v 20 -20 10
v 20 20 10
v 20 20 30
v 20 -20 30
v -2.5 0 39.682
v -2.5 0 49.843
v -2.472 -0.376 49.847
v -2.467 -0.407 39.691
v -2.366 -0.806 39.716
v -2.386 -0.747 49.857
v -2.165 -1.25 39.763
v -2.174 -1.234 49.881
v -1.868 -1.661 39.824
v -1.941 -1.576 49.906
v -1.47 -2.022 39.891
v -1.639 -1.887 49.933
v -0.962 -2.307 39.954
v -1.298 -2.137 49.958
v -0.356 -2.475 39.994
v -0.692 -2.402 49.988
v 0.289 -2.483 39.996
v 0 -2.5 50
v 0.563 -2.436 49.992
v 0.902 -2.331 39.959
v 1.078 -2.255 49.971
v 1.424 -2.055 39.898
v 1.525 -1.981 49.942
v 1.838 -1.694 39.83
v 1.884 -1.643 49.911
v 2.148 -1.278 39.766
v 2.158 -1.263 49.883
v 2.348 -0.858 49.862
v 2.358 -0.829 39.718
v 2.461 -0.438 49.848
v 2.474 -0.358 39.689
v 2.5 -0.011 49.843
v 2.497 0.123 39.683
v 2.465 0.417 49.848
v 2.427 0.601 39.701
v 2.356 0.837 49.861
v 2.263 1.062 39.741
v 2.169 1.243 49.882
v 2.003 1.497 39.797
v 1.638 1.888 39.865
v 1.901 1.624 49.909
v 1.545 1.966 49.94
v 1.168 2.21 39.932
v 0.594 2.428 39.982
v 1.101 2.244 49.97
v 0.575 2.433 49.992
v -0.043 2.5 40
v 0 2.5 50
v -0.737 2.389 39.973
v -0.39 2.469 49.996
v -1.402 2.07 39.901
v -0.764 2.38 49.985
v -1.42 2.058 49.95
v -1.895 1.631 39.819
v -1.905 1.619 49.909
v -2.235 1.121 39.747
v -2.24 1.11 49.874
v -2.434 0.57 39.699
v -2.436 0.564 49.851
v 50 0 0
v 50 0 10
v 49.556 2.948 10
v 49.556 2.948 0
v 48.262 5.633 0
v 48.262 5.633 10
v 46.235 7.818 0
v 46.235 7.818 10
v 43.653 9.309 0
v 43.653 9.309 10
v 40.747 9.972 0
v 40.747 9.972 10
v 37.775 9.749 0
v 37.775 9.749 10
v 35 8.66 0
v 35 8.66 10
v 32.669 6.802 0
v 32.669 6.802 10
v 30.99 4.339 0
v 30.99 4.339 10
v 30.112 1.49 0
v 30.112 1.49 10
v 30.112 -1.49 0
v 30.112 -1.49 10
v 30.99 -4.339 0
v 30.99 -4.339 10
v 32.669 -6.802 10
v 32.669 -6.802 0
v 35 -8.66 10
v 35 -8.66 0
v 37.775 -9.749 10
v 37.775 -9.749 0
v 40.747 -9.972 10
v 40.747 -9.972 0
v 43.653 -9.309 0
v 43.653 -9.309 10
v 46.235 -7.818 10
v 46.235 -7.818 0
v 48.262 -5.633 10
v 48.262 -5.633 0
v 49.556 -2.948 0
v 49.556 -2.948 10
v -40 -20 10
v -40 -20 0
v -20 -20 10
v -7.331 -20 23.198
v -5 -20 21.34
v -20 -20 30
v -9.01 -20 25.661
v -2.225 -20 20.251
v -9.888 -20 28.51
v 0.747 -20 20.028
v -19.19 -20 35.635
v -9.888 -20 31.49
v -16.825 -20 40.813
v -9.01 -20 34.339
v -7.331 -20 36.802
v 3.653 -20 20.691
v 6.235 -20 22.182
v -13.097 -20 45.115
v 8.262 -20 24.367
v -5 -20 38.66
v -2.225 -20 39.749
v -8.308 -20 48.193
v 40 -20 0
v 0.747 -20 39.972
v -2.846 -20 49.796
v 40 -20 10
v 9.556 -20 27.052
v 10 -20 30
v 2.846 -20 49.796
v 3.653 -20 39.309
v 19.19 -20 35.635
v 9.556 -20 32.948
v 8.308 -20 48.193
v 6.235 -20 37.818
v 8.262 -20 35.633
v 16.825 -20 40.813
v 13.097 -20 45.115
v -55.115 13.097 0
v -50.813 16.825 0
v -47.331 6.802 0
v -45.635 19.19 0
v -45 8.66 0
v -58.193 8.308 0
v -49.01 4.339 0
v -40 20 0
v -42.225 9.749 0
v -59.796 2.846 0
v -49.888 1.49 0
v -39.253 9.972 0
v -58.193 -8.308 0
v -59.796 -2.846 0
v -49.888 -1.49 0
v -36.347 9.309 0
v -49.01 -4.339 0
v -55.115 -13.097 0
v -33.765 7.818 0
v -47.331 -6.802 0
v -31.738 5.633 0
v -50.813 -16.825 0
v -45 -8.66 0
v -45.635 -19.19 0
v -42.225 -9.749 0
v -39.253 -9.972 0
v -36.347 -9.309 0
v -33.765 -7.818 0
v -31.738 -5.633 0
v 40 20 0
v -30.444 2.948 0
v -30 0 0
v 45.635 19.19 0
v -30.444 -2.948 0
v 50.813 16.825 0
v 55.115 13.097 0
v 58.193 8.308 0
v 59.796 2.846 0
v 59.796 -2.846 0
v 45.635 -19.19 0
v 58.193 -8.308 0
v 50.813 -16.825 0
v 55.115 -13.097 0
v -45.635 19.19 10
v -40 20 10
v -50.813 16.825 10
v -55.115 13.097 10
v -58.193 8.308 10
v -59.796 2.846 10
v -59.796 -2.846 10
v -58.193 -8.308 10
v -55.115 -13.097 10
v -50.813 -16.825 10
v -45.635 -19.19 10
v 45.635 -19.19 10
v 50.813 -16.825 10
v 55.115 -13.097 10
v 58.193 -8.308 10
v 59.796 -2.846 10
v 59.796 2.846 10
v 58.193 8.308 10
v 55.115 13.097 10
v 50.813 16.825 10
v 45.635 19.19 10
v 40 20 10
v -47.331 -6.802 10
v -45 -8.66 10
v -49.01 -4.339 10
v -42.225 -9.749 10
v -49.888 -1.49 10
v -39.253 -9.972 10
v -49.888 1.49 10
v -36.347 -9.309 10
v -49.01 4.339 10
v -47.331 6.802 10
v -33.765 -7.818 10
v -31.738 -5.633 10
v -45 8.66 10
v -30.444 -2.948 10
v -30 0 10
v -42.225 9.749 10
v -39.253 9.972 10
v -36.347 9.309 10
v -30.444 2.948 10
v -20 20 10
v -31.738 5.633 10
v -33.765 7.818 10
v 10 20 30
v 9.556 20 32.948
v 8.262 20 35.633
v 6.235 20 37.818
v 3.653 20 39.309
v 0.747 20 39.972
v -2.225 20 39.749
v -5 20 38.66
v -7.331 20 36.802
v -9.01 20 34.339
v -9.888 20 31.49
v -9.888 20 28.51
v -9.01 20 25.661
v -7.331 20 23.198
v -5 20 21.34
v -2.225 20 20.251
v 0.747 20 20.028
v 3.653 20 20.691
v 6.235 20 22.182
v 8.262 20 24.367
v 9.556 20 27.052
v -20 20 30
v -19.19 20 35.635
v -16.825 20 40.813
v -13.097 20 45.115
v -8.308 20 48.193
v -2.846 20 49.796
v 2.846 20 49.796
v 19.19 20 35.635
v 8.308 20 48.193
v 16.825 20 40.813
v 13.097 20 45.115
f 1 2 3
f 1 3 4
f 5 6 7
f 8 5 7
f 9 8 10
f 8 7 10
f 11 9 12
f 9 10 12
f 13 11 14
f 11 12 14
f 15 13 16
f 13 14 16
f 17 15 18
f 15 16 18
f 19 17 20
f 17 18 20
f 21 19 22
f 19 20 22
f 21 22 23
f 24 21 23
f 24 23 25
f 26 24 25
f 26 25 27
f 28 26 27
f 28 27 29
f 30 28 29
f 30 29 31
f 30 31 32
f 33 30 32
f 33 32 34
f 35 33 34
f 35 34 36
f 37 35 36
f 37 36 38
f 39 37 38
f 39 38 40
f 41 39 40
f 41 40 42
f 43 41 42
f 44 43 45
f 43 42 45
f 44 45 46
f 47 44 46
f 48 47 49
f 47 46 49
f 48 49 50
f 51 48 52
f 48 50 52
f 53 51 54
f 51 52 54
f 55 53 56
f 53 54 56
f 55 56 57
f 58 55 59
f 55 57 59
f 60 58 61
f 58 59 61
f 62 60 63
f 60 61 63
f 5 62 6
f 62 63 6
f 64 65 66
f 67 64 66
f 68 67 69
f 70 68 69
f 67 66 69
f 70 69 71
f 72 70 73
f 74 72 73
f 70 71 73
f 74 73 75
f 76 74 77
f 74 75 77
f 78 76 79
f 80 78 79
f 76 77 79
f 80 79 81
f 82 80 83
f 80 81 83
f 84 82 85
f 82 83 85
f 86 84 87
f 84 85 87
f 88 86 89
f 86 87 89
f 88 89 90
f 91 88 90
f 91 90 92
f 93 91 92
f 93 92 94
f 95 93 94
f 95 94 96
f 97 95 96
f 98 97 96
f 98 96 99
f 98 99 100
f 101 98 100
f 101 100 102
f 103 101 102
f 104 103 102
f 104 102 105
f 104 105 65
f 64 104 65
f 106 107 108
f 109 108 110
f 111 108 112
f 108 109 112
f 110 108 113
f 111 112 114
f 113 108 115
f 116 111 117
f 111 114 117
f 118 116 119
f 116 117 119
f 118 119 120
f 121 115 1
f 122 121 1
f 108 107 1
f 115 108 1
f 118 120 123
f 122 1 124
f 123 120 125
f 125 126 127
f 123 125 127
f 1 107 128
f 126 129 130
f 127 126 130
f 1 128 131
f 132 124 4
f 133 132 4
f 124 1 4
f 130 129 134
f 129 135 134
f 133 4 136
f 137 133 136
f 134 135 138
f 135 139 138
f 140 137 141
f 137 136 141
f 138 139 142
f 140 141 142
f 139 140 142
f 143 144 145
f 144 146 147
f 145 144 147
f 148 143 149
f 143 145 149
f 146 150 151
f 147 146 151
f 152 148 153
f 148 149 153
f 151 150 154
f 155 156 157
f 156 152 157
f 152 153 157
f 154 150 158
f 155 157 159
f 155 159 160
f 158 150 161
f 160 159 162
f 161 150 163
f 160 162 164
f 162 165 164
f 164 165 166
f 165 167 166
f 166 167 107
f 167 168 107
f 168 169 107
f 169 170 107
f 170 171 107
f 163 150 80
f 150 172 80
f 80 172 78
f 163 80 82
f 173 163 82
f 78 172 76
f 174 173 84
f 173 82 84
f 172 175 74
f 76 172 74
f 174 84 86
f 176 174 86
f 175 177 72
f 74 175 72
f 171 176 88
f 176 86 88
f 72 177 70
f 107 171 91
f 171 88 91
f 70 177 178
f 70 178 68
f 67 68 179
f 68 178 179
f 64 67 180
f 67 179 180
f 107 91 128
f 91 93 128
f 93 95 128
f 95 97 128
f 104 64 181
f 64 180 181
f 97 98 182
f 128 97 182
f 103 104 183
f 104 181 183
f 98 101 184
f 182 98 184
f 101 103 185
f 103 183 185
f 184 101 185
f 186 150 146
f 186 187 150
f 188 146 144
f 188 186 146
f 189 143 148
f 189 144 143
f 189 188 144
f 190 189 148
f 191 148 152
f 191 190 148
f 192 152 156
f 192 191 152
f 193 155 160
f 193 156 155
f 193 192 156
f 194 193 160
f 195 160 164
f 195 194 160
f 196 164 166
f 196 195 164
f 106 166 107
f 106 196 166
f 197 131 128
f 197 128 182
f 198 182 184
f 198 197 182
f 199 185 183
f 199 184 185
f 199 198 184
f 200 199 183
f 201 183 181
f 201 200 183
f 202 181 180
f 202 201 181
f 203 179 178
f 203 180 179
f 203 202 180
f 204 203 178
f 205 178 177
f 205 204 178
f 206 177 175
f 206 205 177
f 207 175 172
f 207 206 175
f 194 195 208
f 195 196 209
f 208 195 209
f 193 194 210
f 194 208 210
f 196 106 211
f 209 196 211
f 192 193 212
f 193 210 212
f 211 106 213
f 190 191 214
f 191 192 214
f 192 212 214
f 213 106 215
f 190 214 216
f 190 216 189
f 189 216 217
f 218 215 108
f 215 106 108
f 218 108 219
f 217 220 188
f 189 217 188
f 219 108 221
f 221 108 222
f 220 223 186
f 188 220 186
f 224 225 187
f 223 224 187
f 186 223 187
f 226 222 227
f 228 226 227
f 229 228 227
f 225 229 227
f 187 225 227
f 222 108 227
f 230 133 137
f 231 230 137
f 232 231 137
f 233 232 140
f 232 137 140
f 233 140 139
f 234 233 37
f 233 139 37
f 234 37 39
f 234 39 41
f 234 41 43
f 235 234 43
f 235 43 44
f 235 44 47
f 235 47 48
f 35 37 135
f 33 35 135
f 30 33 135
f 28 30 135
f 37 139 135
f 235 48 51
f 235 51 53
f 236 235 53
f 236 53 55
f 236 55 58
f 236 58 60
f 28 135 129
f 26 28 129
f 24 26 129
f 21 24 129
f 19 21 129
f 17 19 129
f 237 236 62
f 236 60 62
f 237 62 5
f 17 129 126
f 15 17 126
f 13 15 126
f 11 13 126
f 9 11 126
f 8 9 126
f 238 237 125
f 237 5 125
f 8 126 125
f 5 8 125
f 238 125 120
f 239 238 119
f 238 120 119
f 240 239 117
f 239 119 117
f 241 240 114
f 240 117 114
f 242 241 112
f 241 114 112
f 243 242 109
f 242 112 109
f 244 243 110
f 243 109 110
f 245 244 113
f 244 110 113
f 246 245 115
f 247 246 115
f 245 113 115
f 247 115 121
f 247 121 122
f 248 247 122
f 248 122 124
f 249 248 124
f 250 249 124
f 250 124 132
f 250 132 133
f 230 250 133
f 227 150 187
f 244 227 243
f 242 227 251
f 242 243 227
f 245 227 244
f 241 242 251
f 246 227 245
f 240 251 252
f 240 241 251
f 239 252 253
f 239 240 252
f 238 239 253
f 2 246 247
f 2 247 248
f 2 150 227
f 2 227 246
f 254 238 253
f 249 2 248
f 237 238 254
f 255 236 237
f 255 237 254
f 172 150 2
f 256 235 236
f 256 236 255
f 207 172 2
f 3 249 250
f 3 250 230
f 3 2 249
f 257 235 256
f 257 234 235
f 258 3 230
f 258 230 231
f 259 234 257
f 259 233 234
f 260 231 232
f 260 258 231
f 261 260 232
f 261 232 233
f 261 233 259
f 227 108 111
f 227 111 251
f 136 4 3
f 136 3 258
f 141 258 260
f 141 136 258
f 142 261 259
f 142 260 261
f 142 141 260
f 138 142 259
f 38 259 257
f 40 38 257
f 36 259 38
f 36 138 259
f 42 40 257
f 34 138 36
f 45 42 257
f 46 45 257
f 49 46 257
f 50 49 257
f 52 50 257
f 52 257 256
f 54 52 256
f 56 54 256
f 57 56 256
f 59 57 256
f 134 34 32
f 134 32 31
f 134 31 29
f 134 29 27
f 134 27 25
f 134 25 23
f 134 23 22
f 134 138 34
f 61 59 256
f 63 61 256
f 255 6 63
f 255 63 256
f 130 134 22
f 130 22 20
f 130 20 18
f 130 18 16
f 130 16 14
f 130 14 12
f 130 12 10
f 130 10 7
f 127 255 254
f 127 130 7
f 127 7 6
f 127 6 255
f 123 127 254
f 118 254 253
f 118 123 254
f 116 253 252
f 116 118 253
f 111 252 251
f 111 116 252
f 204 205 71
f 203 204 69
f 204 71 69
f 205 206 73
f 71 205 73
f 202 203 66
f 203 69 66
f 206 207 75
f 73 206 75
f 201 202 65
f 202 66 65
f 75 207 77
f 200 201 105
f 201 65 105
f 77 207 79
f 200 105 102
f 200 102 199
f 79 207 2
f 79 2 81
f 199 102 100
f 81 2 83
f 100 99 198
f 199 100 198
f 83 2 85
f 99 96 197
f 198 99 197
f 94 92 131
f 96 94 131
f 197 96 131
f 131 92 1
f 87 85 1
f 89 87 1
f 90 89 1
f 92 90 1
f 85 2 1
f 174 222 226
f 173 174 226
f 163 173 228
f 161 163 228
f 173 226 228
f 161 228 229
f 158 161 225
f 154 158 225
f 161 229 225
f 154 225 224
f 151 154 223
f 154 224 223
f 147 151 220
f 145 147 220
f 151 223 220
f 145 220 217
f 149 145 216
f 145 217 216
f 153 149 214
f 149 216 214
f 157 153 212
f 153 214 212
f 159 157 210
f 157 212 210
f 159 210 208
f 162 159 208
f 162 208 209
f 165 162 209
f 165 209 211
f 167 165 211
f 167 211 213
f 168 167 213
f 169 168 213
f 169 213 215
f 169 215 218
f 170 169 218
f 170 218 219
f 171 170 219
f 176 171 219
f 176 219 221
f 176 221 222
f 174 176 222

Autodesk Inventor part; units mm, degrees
ref_plane "YZ Plane" through (0, 0, 0) normal (1, 0, 0) x (0, 1, 0)
ref_plane "XZ Plane" through (0, 0, 0) normal (0, 1, 0) x (-1, 0, 0)
sketch "Sketch2" plane through (0, 0, 0) normal (0, 0, 1) x (1, 0, 0)
  line L0 (-20, 20) -> (20, 20)
  line L1 (20, 20) -> (20, -20)
  line L2 (20, -20) -> (-20, -20)
  line L3 (-20, -20) -> (-20, 20)
  line L4 (-20, 20) -> (20, -20) construction
  line L5 (20, 20) -> (-20, -20) construction
  point P0 (0, 0)
  dimension "d5" = 40
  dimension "d6" = 40
extrude "Extrusion2" add sketch "Sketch2" along normal blind 50
sketch "Sketch3" plane through (20, -20, 0) normal (1, 0, 0) x (0, 0, -1)
  line L0 (0, 40) -> (-50, 40) projected
  line L1 (0, 0) -> (-50, 0) projected
  line L2 (0, 40) -> (-10, 40)
  line L3 (-10, 40) -> (-10, 0)
  line L4 (-10, 0) -> (0, 0)
  line L5 (0, 0) -> (0, 40)
  point P0 (0, 20)
  dimension "d9" = 10
extrude "Extrusion3" add sketch "Sketch3" along normal blind 40
sketch "Sketch4" plane through (-20, -20, 0) normal (-1, 0, 0) x (0, 0, 1)
  line L0 (0, 40) -> (0, 0) projected
  line L1 (0, 40) -> (50, 40) projected
  line L2 (0, 0) -> (10, 0)
  line L3 (10, 0) -> (10, 40)
  line L4 (10, 40) -> (0, 40)
  line L5 (0, 40) -> (0, 0)
  point P0 (0, 20)
  dimension "d13" = 10
extrude "Extrusion4" add sketch "Sketch4" along normal blind 40
sketch "Sketch5" plane through (-20, -20, 10) normal (0, 0, 1) x (1, 0, 0)
  line L0 (0, 40) -> (0, 0) projected
  line L1 (-40, 0) -> (80, 0) projected
  line L2 (-20, 40) -> (-40, 40)
  line L3 (-40, 40) -> (-40, 0)
  line L4 (-40, 0) -> (-20, 0)
  line L5 (0, 0) -> (0, 40)
  circle A0 centre (-20, 20) radius 10
  arc A1 (-20, 40) -> (-20, 0) centre (-20, 20) ccw
  line L6 (0, 40) -> (-40, 40) projected
  line L7 (0, 0) -> (-40, 0) projected
  line L8 (-40, 0) -> (-40, 40) projected
  line L9 (60, 0) -> (80, 0)
  line L10 (80, 0) -> (80, 40)
  line L11 (80, 40) -> (60, 40)
  circle A2 centre (60, 20) radius 10
  arc A3 (60, 0) -> (60, 40) centre (60, 20) ccw
  line L12 (40, 40) -> (80, 40) projected
  line L13 (80, 40) -> (80, 0) projected
  line L14 (40, 0) -> (80, 0) projected
  point P0 (20, 20)
  point P1 (80, 20)
  point P2 (-40, 20)
extrude "Extrusion5" cut sketch "Sketch5" against normal through all contours A3 L11 L10 | A3 L10 L1 | A1 L3 L2 | L1 L3 A1 | A0 | A2
sketch "Sketch6" plane through (-20, -20, 50) normal (0, -1, 0) x (1, 0, 0)
  line L0 (0, -40) -> (-20, -40) projected
  line L1 (40, -40) -> (40, 0) projected
  line L2 (40, -20) -> (40, 0)
  line L3 (40, 0) -> (0, 0)
  line L4 (0, 0) -> (0, -20)
  arc A0 (40, -20) -> (0, -20) centre (20, -20) ccw
  circle A1 centre (20, -20) radius 10
  line L5 (0, 0) -> (40, 0) projected
  line L6 (40, -40) -> (40, 0) projected
  line L7 (0, -40) -> (0, 0) projected
  point P0 (20, -50)
  point P1 (20, 0)
  dimension "d20" = 20
extrude "Extrusion6" cut sketch "Sketch6" against normal through all
ref_plane "Work Plane1" through (0, -20, 50) normal (0, 0, -1) x (-1, 0, 0)
sketch "Sketch8" plane through (0, -20, 50) normal (0, 0, -1) x (-1, 0, 0)
  circle A0 centre (0, 20) radius 2.5
  dimension "d31" = 5
extrude "Extrusion7" cut sketch "Sketch8" along normal blind 12
thread "Thread1" size "M20x2.5" class "6H" standard "ANSI Metric M Profile" full length
thread "Thread2" size "M5x0.8" class "6H" standard "ANSI Metric M Profile" full length
thread "Thread3" size "M20x2.5" class "6H" standard "ANSI Metric M Profile" full length
properties part number "06022024_ejercicio"
